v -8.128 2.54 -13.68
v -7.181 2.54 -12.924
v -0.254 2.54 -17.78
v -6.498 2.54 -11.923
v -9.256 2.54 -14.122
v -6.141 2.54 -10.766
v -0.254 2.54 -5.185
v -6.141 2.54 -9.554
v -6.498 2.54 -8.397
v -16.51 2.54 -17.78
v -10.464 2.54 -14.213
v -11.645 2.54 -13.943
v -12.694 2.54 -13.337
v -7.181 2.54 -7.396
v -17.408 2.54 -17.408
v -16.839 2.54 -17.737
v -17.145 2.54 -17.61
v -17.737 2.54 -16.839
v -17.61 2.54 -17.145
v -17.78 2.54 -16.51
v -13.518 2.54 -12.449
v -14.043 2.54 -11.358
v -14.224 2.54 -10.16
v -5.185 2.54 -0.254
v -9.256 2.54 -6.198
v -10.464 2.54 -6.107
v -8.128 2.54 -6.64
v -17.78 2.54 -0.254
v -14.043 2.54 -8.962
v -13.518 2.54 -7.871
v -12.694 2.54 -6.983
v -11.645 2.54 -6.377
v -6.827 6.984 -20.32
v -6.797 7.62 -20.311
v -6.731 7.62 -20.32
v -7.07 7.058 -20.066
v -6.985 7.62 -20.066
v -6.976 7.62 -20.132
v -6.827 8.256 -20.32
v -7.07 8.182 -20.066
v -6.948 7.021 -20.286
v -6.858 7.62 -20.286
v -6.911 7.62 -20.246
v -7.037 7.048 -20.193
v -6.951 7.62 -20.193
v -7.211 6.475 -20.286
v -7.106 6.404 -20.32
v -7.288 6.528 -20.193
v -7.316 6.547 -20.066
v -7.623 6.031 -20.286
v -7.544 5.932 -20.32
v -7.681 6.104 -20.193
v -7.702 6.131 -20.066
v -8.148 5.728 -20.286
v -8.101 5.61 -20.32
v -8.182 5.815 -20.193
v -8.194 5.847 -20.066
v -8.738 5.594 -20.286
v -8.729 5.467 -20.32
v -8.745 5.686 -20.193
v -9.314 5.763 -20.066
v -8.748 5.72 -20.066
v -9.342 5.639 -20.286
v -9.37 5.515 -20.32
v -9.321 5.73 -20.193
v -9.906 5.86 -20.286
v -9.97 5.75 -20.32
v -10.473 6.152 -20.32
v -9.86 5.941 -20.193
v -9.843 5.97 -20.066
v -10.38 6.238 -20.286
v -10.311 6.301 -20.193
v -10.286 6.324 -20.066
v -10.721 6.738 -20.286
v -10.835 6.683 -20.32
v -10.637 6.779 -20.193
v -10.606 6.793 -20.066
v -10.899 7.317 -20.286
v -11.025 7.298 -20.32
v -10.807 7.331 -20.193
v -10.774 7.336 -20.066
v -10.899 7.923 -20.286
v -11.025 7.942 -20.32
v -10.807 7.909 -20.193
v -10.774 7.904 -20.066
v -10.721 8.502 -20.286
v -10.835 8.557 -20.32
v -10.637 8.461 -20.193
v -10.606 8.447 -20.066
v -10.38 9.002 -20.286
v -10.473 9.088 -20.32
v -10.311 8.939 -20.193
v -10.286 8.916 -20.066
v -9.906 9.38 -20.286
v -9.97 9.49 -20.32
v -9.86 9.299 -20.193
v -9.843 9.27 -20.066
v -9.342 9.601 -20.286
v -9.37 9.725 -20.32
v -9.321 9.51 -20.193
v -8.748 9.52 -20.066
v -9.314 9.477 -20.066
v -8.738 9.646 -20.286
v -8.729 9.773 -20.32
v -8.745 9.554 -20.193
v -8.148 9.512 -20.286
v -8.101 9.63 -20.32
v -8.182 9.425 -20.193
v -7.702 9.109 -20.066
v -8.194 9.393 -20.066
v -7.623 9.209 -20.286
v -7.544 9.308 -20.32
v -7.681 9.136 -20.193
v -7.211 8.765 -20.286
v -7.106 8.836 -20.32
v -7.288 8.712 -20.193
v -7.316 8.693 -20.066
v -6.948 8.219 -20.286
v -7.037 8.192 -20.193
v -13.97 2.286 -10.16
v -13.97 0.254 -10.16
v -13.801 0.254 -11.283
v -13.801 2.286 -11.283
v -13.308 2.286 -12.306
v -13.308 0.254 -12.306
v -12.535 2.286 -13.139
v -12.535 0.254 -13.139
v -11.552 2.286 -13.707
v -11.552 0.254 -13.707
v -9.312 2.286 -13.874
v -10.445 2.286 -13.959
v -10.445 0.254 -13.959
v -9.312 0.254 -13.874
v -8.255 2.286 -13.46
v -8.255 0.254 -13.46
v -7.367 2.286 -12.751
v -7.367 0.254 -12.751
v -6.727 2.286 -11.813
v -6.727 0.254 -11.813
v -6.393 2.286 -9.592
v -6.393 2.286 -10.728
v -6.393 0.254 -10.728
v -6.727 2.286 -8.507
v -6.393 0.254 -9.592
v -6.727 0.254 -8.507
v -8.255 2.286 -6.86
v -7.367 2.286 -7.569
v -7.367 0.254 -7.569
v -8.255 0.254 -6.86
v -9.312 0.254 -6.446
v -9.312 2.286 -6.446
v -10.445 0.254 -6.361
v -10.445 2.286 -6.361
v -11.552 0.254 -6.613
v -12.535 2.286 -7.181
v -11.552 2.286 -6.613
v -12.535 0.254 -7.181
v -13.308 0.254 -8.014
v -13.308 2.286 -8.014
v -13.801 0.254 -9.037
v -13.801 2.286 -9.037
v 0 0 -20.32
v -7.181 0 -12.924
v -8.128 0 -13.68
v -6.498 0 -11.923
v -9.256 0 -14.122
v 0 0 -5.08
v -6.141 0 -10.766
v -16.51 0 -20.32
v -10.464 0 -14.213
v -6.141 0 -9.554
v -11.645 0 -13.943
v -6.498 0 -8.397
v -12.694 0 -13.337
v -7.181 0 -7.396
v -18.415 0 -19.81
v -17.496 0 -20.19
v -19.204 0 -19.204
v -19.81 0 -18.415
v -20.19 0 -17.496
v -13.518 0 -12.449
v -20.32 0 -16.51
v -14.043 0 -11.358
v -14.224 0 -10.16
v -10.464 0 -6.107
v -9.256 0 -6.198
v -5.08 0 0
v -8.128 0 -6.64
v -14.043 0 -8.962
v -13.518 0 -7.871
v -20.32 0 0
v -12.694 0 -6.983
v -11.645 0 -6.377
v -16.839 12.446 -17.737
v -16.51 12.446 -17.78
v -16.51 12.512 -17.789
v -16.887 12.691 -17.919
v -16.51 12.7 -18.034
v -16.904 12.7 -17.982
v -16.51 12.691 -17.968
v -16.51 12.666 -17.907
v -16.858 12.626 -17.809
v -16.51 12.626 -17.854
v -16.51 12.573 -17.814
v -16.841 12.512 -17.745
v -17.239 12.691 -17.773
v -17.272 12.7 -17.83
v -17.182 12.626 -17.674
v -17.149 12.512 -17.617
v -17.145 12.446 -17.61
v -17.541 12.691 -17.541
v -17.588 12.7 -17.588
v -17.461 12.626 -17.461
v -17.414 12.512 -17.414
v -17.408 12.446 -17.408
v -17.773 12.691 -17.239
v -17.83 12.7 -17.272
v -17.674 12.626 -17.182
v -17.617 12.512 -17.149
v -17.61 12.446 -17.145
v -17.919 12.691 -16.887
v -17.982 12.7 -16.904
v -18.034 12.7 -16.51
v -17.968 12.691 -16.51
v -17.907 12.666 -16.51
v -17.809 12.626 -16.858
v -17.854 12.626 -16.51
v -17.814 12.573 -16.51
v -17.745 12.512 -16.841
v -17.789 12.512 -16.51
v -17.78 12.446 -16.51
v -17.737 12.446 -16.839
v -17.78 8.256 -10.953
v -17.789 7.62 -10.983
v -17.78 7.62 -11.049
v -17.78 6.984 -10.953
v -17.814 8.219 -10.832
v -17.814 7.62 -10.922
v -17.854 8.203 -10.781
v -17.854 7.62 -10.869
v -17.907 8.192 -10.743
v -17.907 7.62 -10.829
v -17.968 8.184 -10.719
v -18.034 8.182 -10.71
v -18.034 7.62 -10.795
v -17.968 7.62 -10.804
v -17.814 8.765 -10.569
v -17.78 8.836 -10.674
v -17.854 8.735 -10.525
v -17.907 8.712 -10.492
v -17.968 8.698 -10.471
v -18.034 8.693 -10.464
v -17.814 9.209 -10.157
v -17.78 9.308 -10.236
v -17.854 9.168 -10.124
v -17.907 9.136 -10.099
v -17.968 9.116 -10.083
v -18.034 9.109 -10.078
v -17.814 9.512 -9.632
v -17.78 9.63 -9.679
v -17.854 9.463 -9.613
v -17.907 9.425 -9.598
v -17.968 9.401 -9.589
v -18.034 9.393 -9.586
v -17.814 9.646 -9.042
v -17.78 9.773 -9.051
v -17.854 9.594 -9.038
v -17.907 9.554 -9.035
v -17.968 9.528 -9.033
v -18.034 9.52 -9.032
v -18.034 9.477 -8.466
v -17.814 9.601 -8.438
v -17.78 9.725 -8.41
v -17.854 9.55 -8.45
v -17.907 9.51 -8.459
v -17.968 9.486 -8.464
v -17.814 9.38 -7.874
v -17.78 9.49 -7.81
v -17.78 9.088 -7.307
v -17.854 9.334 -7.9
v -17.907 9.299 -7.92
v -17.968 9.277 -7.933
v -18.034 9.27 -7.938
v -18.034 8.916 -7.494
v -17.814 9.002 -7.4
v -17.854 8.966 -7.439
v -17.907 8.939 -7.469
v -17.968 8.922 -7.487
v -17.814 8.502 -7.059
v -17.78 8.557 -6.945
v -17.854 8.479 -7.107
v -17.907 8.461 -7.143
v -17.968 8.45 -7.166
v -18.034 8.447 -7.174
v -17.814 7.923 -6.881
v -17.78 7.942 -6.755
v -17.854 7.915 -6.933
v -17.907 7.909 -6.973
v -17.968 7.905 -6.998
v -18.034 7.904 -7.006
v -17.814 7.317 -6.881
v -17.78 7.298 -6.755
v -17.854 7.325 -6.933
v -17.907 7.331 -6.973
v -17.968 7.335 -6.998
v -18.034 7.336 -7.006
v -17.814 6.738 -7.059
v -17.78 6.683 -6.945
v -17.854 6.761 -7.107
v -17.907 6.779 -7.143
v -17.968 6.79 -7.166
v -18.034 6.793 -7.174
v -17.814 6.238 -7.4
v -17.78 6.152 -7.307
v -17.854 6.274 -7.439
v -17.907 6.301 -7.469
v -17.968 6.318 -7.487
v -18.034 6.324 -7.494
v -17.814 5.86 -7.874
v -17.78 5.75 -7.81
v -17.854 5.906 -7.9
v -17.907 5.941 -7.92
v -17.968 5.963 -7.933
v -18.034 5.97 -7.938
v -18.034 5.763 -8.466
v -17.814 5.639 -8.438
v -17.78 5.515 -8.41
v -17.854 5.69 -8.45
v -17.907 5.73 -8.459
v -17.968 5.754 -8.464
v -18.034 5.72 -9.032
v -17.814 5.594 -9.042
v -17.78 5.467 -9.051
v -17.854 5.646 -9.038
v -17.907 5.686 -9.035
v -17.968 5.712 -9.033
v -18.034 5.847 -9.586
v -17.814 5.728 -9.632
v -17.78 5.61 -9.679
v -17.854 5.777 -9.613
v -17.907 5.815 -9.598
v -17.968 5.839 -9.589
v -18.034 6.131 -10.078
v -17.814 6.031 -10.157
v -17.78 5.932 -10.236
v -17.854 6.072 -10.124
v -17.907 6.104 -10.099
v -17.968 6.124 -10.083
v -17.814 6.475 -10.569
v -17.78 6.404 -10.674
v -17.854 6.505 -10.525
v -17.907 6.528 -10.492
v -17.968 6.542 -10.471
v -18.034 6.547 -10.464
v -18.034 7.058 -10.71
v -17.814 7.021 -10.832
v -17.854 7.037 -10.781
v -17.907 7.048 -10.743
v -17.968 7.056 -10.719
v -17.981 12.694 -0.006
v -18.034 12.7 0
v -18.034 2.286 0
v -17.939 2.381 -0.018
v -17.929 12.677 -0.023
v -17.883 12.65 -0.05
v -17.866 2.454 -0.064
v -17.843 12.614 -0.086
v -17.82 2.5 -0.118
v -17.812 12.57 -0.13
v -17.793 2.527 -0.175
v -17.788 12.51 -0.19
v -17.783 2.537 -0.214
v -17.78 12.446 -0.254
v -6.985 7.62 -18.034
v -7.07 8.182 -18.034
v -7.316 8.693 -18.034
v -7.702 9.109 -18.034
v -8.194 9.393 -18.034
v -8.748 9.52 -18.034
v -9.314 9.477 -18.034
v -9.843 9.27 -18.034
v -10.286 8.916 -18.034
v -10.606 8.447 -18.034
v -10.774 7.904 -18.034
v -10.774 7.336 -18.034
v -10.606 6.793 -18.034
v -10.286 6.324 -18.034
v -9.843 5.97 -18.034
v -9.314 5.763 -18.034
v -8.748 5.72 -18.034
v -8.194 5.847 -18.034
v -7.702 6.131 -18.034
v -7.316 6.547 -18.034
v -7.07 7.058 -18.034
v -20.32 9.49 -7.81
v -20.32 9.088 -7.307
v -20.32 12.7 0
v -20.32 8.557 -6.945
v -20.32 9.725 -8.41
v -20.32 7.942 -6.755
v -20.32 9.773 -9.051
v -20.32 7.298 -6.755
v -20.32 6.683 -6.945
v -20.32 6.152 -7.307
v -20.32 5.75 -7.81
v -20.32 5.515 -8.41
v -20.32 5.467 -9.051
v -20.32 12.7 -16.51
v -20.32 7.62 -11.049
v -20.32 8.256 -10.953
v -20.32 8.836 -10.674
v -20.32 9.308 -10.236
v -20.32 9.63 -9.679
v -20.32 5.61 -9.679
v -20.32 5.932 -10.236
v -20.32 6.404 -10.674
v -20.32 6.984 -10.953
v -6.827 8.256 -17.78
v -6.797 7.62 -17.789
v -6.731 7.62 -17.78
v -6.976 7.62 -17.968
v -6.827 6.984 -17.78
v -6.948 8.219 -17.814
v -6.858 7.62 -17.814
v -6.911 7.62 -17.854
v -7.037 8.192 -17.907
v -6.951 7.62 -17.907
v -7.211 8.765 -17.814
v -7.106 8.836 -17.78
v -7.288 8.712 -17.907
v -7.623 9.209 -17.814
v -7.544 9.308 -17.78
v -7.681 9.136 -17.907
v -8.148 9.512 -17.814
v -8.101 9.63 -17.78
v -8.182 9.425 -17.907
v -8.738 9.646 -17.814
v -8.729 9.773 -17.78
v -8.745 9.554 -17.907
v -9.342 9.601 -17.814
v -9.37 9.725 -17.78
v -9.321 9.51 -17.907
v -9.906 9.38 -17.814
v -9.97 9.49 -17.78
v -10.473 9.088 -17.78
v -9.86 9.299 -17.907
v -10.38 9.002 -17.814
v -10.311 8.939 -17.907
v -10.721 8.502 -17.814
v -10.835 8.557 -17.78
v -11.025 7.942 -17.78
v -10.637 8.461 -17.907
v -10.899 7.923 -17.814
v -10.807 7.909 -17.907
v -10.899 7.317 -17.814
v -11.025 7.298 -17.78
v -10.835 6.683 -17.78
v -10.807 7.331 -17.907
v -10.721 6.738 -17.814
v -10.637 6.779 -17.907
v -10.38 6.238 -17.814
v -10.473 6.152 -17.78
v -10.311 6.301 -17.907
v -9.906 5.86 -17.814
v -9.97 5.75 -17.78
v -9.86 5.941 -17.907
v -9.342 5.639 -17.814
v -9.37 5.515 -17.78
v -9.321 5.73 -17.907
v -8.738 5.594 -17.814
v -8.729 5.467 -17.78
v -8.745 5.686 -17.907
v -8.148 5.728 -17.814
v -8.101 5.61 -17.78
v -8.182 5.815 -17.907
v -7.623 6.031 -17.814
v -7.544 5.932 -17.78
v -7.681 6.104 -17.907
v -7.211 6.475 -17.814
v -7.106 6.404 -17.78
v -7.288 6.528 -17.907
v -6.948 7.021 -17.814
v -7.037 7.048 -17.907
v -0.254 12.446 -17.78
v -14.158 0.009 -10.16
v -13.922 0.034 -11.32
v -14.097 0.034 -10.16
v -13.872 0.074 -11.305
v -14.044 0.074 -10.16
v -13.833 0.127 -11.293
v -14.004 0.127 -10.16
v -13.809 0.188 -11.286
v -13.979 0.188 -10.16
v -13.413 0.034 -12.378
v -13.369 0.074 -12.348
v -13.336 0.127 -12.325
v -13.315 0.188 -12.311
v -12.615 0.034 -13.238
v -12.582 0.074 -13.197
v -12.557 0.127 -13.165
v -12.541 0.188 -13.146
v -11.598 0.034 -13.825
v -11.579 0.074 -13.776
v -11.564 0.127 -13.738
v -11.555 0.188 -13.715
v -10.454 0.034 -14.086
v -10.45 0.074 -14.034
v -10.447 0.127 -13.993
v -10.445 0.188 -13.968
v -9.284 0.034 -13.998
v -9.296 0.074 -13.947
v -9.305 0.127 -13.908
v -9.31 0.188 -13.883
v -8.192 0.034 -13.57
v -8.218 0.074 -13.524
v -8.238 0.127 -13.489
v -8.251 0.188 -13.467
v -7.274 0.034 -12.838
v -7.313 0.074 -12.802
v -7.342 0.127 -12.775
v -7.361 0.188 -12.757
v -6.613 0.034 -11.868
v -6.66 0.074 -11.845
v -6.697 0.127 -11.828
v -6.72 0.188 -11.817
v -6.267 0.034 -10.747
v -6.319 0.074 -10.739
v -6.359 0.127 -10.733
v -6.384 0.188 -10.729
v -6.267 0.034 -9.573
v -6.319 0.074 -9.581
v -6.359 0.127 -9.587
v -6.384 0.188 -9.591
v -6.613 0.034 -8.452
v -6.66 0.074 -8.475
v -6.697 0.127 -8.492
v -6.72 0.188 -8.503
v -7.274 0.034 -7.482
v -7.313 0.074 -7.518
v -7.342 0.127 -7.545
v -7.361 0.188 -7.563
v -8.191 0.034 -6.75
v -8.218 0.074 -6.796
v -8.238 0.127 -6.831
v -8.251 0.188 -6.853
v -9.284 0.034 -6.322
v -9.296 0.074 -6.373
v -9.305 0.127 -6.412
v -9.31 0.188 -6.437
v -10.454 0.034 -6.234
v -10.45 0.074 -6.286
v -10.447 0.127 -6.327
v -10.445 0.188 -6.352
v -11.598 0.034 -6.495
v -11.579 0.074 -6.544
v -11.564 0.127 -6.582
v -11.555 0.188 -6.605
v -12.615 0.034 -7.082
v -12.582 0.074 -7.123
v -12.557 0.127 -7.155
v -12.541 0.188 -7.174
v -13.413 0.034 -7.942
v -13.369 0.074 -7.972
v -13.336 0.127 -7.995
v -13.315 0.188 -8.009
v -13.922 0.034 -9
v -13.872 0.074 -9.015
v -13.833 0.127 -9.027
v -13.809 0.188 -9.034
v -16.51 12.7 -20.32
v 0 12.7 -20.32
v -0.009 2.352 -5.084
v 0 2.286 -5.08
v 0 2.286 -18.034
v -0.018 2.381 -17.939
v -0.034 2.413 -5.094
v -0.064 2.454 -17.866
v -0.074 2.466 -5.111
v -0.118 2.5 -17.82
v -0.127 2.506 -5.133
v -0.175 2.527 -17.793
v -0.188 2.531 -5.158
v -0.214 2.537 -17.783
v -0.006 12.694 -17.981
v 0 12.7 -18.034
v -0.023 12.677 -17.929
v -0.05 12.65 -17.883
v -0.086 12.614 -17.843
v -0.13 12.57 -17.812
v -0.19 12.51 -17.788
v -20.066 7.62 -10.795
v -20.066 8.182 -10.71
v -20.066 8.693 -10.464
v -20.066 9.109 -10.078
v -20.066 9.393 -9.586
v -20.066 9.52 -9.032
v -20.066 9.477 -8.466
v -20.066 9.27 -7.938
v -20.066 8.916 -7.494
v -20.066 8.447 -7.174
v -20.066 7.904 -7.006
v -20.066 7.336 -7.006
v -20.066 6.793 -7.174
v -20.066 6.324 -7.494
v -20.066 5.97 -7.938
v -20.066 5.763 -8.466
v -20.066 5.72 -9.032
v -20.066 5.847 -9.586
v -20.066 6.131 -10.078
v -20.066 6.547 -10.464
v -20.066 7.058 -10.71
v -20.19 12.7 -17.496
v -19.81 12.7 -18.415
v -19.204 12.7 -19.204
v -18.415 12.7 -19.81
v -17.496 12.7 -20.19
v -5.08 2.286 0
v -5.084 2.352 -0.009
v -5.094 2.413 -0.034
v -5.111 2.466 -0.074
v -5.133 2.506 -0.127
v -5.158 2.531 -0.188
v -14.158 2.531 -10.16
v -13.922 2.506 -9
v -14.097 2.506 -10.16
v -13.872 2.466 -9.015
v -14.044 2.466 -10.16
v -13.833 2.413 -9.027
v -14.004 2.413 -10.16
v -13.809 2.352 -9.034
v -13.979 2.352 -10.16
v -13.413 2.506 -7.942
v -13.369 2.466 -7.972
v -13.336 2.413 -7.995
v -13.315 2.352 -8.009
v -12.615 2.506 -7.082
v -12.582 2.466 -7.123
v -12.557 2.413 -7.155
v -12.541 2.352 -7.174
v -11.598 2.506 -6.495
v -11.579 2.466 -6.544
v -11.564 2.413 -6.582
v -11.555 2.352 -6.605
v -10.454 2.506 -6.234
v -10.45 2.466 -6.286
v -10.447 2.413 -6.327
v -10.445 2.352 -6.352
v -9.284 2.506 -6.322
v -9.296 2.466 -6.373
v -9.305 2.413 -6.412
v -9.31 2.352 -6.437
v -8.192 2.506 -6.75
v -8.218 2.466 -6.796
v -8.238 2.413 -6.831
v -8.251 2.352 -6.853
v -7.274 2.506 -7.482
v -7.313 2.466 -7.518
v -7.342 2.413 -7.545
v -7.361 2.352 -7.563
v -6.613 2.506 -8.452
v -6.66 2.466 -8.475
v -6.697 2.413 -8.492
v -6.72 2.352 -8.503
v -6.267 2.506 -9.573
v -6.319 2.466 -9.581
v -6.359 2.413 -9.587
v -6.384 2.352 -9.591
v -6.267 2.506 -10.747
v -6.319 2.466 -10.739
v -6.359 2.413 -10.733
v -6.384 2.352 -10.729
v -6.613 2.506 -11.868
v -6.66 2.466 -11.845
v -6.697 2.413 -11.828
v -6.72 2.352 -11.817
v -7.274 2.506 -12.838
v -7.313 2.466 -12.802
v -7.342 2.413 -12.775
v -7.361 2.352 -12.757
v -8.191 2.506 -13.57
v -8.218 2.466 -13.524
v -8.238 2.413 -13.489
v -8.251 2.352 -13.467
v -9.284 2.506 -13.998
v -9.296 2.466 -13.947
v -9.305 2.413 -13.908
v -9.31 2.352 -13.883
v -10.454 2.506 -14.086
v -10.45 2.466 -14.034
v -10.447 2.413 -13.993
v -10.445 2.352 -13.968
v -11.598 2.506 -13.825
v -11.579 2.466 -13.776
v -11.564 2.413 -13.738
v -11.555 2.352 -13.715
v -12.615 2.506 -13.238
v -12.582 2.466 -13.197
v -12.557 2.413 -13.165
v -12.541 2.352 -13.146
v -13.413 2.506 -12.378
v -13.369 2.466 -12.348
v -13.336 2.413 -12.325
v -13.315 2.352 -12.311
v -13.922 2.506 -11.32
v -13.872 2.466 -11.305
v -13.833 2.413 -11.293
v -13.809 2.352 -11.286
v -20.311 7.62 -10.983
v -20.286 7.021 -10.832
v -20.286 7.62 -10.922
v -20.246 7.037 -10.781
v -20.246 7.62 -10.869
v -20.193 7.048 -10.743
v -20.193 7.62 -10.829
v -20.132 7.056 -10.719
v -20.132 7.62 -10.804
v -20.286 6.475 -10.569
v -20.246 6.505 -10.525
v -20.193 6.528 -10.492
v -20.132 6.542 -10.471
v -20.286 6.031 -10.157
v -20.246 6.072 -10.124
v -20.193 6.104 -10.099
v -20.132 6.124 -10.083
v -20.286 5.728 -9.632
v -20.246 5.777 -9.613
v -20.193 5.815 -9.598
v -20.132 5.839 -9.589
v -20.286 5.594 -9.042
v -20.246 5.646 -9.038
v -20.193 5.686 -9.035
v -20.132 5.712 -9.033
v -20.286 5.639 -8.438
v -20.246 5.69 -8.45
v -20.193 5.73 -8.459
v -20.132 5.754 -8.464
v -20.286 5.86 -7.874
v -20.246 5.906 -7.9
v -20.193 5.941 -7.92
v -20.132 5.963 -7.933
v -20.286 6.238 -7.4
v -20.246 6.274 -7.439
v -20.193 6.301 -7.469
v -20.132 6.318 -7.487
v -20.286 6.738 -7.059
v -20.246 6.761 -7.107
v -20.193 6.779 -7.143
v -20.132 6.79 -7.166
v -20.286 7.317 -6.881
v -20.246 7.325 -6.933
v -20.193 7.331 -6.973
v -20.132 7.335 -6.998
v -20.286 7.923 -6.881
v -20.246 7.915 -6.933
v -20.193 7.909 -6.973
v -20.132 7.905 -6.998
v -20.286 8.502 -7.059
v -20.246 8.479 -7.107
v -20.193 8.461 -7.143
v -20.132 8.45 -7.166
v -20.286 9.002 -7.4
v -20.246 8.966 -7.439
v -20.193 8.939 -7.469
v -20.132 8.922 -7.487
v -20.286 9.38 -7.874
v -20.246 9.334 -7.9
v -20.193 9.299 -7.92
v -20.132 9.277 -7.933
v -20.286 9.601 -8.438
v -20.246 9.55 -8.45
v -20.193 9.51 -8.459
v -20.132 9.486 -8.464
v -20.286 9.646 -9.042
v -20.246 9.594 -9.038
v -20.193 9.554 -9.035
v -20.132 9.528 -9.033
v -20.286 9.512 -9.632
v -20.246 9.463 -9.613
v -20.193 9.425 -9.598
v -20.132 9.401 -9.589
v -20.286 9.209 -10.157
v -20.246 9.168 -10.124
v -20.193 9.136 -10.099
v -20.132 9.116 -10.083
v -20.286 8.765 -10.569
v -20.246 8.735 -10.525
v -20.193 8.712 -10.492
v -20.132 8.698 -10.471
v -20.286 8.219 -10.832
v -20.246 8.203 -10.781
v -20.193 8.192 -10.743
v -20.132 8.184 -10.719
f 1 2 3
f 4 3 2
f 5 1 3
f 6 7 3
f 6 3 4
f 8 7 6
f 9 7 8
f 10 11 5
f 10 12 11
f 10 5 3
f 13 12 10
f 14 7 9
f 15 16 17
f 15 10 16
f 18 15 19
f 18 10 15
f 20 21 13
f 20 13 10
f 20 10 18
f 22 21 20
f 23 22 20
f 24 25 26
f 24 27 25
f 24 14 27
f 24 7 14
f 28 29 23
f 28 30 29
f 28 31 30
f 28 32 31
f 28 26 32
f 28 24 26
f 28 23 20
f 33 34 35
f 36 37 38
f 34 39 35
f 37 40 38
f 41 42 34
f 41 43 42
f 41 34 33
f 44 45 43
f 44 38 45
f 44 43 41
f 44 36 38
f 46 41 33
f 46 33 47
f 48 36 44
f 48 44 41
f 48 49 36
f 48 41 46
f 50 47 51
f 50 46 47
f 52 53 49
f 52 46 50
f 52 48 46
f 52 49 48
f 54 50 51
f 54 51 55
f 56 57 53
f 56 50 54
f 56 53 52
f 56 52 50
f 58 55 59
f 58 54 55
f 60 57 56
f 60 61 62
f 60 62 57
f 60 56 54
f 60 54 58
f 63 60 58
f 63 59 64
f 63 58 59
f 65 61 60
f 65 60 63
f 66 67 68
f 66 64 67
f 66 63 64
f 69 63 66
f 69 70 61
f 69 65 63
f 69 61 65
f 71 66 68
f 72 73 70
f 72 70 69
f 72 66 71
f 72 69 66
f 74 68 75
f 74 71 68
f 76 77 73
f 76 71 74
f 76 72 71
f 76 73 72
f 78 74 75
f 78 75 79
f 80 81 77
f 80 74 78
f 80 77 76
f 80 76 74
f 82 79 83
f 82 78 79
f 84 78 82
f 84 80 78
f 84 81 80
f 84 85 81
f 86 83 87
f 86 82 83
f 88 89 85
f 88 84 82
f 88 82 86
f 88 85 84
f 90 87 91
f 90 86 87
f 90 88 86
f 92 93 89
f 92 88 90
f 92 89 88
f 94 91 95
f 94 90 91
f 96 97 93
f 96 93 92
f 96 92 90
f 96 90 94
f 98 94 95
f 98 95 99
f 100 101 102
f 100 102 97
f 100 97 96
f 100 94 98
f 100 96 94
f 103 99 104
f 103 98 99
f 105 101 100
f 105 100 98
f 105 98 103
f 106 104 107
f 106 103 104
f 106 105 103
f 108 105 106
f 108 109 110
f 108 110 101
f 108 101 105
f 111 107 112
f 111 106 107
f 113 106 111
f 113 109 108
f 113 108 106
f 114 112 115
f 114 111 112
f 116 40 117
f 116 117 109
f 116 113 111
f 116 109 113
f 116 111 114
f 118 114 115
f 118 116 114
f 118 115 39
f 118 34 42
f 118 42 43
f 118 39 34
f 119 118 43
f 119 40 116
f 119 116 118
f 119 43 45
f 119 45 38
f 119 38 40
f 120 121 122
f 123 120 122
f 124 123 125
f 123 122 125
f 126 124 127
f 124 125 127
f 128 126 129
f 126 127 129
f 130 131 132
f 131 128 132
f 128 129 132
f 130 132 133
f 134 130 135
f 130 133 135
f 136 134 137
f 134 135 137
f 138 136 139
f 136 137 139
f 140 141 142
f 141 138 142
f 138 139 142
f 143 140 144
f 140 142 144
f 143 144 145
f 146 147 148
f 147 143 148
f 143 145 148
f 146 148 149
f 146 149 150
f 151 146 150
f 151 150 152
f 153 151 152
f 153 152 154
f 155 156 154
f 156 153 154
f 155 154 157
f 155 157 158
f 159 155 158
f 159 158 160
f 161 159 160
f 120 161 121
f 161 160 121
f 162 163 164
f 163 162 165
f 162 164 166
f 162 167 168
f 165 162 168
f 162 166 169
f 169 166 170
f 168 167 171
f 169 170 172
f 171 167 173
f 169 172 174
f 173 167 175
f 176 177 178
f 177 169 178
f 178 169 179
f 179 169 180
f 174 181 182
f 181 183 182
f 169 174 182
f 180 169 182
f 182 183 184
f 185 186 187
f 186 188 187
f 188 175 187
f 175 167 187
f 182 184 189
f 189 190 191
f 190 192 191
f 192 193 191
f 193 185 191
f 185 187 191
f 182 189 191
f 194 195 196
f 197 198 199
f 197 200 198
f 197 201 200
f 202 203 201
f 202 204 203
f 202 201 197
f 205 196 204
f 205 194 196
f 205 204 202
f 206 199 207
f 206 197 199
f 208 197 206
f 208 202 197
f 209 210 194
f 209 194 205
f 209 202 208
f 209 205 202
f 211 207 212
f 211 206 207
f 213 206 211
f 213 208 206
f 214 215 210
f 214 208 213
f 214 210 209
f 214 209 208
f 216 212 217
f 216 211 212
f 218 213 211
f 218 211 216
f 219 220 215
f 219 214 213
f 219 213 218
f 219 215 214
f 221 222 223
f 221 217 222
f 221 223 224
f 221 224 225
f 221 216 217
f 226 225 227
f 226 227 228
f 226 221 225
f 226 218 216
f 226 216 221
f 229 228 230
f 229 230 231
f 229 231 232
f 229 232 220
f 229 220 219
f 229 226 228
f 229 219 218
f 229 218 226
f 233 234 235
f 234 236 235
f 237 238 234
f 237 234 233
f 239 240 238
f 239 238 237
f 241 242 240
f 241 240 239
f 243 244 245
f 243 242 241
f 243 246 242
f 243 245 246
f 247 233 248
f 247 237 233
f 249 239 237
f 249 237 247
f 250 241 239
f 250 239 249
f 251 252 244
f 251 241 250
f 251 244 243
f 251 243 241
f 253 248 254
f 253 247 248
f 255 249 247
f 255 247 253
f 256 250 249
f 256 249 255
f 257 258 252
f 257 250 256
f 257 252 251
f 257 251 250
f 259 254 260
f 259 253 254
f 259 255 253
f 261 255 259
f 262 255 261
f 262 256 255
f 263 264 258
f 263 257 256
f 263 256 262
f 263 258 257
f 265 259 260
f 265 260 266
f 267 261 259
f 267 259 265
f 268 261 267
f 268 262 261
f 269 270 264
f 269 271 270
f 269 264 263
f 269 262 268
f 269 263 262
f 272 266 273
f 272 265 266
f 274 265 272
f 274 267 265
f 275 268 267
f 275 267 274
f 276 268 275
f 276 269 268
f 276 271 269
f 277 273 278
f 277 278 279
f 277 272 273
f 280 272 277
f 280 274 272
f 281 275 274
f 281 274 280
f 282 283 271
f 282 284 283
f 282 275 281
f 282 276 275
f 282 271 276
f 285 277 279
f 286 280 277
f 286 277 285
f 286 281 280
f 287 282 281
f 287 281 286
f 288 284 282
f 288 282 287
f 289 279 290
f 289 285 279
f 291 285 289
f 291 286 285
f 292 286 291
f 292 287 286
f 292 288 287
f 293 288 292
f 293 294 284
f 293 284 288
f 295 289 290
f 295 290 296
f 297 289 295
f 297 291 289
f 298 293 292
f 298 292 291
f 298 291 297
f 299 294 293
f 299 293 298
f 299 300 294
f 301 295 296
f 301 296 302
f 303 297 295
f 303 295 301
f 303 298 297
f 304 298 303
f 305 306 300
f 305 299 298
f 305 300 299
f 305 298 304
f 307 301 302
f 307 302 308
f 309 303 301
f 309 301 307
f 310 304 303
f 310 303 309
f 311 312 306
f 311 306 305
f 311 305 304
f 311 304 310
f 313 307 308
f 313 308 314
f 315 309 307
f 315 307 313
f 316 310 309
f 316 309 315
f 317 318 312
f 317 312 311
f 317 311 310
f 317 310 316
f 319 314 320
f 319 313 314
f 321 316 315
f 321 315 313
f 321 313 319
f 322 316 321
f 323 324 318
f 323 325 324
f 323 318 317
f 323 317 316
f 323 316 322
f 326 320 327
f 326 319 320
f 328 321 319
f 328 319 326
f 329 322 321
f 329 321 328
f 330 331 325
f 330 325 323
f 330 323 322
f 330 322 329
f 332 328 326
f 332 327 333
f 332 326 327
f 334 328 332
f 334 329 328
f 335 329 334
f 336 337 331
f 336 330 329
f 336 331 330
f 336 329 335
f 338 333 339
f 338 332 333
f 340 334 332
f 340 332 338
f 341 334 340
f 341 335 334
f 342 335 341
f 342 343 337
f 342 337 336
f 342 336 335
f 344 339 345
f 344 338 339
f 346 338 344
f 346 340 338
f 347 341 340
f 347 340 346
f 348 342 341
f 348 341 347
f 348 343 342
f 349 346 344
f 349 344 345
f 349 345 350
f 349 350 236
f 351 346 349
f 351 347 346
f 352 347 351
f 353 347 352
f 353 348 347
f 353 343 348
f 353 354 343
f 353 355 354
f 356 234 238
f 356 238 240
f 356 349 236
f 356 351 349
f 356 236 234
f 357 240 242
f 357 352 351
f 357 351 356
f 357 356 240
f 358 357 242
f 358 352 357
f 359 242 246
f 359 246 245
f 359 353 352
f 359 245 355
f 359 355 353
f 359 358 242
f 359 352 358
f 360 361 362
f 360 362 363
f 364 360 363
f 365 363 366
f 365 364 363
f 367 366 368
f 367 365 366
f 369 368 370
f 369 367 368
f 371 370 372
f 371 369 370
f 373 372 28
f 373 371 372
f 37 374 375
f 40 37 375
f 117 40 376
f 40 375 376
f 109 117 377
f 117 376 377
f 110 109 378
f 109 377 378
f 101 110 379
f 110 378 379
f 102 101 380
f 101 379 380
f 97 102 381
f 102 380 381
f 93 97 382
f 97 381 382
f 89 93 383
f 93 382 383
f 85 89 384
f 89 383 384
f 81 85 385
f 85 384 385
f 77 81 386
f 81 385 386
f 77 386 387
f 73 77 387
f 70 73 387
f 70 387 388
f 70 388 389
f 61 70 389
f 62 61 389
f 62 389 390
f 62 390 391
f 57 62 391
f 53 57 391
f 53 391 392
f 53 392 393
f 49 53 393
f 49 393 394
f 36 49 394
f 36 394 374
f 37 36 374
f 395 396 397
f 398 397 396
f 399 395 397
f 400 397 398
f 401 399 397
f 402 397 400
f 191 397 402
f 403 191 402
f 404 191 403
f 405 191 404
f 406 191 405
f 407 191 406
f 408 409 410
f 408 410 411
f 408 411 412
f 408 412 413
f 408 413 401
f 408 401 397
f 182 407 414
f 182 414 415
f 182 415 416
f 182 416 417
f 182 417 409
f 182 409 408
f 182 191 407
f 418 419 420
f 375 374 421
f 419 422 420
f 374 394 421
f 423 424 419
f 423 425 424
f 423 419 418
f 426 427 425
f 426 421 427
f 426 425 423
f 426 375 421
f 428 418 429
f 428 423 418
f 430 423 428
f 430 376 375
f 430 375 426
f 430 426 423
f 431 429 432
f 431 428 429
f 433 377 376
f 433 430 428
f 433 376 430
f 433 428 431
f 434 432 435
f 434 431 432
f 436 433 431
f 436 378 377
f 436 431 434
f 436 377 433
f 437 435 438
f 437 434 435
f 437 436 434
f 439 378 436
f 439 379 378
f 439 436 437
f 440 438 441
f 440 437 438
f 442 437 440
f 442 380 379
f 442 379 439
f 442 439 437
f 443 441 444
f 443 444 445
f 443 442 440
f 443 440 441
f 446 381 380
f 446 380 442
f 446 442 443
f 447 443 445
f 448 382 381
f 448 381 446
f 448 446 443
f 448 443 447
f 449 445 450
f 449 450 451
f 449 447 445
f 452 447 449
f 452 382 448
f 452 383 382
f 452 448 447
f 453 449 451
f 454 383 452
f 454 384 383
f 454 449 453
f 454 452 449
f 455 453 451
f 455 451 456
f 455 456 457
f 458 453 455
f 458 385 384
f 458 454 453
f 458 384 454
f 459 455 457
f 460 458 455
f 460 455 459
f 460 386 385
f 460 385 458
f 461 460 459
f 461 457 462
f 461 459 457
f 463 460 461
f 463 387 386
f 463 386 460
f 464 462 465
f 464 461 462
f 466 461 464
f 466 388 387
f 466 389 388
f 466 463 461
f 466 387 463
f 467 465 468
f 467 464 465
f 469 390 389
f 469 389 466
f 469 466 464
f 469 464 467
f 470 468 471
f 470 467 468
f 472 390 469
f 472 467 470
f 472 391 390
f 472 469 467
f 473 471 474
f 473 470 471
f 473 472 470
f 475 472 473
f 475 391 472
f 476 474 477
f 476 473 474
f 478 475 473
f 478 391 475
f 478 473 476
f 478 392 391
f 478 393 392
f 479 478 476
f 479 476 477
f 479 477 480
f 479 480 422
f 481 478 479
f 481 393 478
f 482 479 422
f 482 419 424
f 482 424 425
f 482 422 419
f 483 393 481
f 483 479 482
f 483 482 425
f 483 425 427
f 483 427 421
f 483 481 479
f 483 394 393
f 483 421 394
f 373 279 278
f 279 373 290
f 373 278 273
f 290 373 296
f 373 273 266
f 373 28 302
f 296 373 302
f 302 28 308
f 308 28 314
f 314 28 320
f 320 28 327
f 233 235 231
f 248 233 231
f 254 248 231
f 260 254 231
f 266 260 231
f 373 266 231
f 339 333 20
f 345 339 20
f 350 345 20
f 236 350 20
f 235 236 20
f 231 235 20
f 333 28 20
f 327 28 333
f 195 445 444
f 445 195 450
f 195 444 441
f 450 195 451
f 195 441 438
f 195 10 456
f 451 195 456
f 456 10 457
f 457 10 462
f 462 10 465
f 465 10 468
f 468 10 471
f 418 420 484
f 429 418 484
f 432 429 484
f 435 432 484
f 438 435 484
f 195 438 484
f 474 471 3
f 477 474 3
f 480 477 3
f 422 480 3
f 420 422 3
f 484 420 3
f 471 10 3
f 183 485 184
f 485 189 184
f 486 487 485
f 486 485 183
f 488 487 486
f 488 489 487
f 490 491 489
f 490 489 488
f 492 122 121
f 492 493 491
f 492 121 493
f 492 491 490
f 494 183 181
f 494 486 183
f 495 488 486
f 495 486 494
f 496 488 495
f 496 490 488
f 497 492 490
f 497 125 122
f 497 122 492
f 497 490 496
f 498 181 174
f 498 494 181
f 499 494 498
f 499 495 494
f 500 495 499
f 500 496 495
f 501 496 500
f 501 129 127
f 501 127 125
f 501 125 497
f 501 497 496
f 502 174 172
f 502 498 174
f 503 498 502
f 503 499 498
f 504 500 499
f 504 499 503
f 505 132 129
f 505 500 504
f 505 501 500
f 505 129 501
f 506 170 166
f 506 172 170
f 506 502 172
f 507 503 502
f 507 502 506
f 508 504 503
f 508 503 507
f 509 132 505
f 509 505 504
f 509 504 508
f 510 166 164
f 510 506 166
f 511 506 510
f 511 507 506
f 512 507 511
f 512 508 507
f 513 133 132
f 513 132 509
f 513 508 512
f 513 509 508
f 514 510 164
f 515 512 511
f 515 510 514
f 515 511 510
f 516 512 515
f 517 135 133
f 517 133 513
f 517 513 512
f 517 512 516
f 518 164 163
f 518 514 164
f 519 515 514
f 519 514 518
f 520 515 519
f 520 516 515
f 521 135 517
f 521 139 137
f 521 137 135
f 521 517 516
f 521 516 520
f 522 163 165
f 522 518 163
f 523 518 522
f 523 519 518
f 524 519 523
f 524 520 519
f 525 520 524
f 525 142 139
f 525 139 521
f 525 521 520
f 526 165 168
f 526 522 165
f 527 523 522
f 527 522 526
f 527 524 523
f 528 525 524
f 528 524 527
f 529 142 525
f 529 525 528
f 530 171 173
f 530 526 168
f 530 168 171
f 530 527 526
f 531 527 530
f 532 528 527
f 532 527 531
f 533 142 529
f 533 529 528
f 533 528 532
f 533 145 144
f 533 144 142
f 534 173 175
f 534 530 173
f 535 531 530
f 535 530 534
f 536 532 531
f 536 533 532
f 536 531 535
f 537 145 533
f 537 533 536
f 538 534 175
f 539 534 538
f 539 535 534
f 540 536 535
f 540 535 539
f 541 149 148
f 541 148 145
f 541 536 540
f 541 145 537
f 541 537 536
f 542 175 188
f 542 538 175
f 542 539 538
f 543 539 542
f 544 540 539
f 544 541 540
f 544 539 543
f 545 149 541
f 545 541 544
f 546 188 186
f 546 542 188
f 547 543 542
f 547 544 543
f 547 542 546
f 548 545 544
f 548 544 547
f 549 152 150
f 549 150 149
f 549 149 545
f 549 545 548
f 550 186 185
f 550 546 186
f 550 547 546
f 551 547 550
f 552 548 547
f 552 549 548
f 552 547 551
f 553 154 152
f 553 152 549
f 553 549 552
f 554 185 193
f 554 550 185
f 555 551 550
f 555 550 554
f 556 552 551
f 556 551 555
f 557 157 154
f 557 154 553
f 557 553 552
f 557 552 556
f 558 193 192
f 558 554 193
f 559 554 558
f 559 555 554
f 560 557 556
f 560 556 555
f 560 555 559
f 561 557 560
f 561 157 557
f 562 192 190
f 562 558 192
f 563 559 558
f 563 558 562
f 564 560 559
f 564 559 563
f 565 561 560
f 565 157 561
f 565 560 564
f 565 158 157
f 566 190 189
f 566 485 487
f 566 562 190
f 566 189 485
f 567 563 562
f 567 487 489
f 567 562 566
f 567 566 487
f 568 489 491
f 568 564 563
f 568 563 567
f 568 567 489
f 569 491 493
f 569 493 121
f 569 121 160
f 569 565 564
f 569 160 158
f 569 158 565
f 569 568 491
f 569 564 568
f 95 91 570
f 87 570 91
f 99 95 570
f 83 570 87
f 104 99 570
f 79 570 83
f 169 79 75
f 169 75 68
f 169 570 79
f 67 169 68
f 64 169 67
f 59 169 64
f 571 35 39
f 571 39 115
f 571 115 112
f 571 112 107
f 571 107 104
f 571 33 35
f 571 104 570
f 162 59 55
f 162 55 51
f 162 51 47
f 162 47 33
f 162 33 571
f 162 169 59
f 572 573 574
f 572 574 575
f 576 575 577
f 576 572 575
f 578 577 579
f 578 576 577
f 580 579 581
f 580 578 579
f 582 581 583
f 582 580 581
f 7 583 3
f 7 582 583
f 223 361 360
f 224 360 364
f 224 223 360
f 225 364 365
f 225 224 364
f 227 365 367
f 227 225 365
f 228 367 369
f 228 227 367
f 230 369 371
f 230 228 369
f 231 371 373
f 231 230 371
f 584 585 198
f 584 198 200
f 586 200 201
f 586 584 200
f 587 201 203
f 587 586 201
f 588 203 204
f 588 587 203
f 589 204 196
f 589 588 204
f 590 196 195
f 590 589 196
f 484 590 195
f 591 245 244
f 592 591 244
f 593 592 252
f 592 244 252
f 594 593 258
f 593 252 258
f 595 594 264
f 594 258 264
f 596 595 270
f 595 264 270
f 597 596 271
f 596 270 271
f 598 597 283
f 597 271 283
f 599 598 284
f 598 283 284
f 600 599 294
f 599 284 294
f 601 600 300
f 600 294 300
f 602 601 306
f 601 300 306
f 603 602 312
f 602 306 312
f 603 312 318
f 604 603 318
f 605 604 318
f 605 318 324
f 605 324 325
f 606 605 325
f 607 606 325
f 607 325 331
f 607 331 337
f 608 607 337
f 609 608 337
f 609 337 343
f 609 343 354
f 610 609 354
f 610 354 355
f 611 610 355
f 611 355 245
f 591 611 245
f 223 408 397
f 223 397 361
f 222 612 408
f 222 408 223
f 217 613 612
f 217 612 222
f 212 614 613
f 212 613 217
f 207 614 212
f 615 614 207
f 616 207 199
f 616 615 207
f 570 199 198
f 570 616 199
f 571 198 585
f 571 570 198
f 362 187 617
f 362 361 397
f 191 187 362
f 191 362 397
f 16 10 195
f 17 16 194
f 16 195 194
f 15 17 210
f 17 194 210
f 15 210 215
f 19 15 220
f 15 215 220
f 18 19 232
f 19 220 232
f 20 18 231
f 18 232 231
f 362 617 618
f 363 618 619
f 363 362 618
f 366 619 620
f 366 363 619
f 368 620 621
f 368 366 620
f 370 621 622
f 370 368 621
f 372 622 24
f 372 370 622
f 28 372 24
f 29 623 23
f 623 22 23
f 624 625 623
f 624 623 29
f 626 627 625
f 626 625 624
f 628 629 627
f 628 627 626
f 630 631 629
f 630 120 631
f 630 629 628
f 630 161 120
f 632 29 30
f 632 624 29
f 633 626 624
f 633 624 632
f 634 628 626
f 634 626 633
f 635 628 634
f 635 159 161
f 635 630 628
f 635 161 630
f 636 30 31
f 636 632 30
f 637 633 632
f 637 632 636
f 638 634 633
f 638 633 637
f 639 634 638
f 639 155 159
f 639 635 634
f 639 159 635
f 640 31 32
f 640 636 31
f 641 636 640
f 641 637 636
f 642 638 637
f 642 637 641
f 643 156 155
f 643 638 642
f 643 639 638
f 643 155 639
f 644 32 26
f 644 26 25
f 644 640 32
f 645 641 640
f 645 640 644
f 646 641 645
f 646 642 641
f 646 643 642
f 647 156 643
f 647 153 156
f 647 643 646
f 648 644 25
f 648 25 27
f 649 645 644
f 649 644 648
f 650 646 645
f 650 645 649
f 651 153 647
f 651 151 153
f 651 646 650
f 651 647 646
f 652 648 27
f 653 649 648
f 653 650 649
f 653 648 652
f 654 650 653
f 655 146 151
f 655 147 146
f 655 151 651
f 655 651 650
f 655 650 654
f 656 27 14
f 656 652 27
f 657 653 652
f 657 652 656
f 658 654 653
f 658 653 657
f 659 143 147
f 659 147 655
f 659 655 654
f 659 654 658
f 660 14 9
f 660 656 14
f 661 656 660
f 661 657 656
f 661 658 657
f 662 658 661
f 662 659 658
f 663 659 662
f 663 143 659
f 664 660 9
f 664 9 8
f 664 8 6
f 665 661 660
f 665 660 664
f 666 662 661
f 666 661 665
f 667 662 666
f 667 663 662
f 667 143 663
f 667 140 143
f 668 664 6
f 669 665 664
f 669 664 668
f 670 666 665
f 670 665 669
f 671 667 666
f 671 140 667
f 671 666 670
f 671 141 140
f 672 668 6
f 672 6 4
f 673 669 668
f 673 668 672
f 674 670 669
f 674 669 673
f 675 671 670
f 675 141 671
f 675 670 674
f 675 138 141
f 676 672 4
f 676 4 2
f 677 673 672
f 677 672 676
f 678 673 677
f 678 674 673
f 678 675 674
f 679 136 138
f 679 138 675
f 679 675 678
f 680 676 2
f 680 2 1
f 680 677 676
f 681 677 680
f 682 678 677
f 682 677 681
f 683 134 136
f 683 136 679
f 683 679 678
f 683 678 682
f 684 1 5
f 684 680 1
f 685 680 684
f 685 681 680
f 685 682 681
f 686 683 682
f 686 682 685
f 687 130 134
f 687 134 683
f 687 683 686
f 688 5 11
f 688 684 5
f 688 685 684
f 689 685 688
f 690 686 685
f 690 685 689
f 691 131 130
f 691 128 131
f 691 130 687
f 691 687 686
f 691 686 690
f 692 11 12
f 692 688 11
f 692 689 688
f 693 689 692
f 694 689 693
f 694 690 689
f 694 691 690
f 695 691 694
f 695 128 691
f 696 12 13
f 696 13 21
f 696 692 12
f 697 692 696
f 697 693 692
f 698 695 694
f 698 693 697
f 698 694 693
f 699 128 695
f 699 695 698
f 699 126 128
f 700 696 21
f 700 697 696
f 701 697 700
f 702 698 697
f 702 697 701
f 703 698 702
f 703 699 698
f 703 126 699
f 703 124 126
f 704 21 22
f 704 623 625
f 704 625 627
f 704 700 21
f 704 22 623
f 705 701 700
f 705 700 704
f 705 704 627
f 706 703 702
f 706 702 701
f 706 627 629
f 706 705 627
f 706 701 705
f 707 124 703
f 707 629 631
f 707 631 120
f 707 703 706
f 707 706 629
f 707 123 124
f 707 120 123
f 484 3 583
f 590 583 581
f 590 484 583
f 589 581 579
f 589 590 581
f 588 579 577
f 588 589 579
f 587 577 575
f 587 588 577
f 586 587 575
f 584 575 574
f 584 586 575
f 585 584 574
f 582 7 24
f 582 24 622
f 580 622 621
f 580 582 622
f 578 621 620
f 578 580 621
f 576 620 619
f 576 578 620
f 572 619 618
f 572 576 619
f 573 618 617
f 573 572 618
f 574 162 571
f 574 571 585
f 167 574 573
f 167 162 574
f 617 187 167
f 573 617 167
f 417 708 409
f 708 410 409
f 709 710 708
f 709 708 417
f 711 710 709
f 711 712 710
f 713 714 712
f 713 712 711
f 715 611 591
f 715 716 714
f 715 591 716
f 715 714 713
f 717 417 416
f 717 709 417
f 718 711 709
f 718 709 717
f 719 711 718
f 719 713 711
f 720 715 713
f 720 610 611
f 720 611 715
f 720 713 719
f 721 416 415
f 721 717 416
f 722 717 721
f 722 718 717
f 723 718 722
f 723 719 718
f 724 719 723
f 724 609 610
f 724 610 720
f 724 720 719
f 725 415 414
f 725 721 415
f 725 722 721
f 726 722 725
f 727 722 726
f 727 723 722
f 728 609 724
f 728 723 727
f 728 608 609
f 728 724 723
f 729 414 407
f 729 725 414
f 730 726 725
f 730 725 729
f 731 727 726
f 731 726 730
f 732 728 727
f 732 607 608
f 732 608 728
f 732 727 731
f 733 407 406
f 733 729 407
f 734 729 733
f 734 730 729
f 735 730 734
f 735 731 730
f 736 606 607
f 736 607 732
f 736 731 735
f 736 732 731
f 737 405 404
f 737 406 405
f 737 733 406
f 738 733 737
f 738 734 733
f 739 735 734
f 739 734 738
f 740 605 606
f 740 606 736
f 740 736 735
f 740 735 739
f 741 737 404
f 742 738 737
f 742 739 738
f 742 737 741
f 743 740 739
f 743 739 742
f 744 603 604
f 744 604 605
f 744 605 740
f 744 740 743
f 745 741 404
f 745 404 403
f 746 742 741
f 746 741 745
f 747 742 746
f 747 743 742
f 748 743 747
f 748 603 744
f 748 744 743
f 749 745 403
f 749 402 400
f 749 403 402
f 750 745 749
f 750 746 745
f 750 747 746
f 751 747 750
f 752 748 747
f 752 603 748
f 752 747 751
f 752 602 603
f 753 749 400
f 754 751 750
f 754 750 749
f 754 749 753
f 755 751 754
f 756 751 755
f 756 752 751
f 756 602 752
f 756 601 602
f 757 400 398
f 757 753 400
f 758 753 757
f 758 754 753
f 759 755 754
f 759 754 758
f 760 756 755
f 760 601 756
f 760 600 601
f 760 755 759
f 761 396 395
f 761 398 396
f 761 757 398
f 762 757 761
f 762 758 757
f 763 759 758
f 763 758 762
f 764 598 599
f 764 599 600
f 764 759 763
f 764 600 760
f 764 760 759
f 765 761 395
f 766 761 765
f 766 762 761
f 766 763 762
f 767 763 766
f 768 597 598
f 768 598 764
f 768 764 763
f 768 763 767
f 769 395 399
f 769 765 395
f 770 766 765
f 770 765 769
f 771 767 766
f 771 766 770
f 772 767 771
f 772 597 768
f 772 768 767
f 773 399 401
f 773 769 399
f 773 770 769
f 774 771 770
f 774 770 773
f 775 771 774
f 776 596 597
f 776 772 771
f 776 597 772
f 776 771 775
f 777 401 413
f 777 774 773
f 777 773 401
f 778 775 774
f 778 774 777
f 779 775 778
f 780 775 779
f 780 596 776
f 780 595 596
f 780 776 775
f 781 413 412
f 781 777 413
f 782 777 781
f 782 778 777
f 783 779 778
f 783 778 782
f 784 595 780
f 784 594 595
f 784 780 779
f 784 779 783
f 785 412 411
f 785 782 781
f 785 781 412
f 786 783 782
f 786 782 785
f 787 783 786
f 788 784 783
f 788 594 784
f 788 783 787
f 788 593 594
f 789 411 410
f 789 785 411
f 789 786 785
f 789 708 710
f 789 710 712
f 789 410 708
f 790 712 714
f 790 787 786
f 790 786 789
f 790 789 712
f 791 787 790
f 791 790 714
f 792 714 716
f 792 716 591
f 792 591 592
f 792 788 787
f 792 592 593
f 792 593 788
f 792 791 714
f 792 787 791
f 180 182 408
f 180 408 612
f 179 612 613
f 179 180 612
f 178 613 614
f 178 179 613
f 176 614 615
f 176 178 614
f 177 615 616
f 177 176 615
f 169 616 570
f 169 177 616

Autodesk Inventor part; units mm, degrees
ref_plane "YZ Plane" through (0, 0, 0) normal (1, 0, 0) x (0, 1, 0)
ref_plane "XZ Plane" through (0, 0, 0) normal (0, 1, 0) x (-1, 0, 0)
ref_plane "XY Plane" through (0, 0, 0) normal (0, 0, 1) x (1, 0, 0)
sketch "Sketch1" plane through (0, 0, 0) normal (0, 1, 0) x (-1, 0, 0)
  line L0 (0, 0) -> (20.32, 0)
  line L1 (20.32, 0) -> (20.32, -20.32)
  line L2 (20.32, -20.32) -> (0, -20.32)
  line L3 (0, -20.32) -> (0, 0)
  circle A0 centre (10.16, -10.16) radius 3.81
  line L4 (5.08, 0) -> (11.3037, 0) construction
  line L5 (5.08, 0) -> (0, -5.08)
  line L6 (5.08, 0) -> (12.2642, 0) construction
  dimension "d0" = 20.32
  dimension "d1" = 20.32
  dimension "d2" = 7.62
  dimension "d3" = 10.16
  dimension "d4" = 10.16
  dimension "d6" = 135
  dimension "d7" = 5.08
  dimension "d8" = 5.08
extrude "Extrusion1" add sketch "Sketch1" along normal blind 2.54 contours L0 L1 L2 L3 L5
sketch "Sketch2" plane through (0, 2.54, 0) normal (0, 1, 0) x (1, 0, 0)
  line L0 (-20.32, 20.32) -> (-20.32, 0) projected
  line L1 (0, 20.32) -> (-20.32, 20.32) projected
  line L2 (-20.32, 0) -> (-17.78, 0)
  line L3 (-17.78, 0) -> (-17.78, 20.32)
  line L4 (-17.78, 20.32) -> (-20.32, 20.32)
  line L5 (-20.32, 20.32) -> (-20.32, 0)
  line L6 (0, 5.08) -> (0, 20.32) projected
  line L7 (0, 20.32) -> (-20.32, 20.32)
  line L8 (-20.32, 20.32) -> (-20.32, 17.78)
  line L9 (-20.32, 17.78) -> (0, 17.78)
  line L10 (0, 17.78) -> (0, 20.32)
  point P0 (0, 0)
  point P1 (-17.78, 17.78)
  dimension "d11" = 2.54
  dimension "d12" = 2.54
extrude "Extrusion2" add sketch "Sketch2" along normal blind 10.16
fillet "Fillet1" radius 1.27 1 edges at (-17.78, 7.62, -17.78)
fillet "Fillet2" radius 3.81 1 edges at (-20.32, 6.35, -20.32)
sketch "Sketch3" plane through (-17.78, 2.54, 0) normal (1, 0, 0) x (0, 0, -1)
  circle A0 centre (8.89, 5.08) radius 1.905
  line L0 (0, 10.16) -> (16.51, 10.16) projected
  line L1 (0, 0) -> (0, 10.16) projected
  point P0 (0, -2.54)
  dimension "d17" = 3.81
  dimension "d18" = 5.08
  dimension "d19" = 8.89
extrude "Extrusion3" cut sketch "Sketch3" against normal blind 10.16
sketch "Sketch4" plane through (0, 2.54, -17.78) normal (0, 0, 1) x (1, 0, 0)
  circle A0 centre (-8.89, 5.08) radius 1.905
  line L0 (-16.51, 10.16) -> (0, 10.16) projected
  line L1 (0, 0) -> (0, 10.16) projected
  point P0 (0, -2.54)
  point P1 (0, 5.08)
  dimension "d22" = 3.81
  dimension "d23" = 5.08
  dimension "d24" = 8.89
extrude "Extrusion4" cut sketch "Sketch4" against normal blind 10.16
fillet "Fillet3" radius 0.254 14 edges at (-17.408, 12.7, -17.408) (-8.255, 12.7, -17.78) (-17.78, 12.7, -8.255) (0, 7.62, -17.78) (0, 2.54, -11.43) (-2.54, 2.54, -2.54) (-11.43, 2.54, 0) (-17.78, 7.62, 0) (-10.795, 7.62, -17.78) (-17.78, 7.62, -6.985) (-10.795, 7.62, -20.32) (-20.32, 7.62, -6.985) (-6.35, 0, -10.16) (-6.35, 2.54, -10.16)
properties part number "Basics" material "Steel, Cast"
